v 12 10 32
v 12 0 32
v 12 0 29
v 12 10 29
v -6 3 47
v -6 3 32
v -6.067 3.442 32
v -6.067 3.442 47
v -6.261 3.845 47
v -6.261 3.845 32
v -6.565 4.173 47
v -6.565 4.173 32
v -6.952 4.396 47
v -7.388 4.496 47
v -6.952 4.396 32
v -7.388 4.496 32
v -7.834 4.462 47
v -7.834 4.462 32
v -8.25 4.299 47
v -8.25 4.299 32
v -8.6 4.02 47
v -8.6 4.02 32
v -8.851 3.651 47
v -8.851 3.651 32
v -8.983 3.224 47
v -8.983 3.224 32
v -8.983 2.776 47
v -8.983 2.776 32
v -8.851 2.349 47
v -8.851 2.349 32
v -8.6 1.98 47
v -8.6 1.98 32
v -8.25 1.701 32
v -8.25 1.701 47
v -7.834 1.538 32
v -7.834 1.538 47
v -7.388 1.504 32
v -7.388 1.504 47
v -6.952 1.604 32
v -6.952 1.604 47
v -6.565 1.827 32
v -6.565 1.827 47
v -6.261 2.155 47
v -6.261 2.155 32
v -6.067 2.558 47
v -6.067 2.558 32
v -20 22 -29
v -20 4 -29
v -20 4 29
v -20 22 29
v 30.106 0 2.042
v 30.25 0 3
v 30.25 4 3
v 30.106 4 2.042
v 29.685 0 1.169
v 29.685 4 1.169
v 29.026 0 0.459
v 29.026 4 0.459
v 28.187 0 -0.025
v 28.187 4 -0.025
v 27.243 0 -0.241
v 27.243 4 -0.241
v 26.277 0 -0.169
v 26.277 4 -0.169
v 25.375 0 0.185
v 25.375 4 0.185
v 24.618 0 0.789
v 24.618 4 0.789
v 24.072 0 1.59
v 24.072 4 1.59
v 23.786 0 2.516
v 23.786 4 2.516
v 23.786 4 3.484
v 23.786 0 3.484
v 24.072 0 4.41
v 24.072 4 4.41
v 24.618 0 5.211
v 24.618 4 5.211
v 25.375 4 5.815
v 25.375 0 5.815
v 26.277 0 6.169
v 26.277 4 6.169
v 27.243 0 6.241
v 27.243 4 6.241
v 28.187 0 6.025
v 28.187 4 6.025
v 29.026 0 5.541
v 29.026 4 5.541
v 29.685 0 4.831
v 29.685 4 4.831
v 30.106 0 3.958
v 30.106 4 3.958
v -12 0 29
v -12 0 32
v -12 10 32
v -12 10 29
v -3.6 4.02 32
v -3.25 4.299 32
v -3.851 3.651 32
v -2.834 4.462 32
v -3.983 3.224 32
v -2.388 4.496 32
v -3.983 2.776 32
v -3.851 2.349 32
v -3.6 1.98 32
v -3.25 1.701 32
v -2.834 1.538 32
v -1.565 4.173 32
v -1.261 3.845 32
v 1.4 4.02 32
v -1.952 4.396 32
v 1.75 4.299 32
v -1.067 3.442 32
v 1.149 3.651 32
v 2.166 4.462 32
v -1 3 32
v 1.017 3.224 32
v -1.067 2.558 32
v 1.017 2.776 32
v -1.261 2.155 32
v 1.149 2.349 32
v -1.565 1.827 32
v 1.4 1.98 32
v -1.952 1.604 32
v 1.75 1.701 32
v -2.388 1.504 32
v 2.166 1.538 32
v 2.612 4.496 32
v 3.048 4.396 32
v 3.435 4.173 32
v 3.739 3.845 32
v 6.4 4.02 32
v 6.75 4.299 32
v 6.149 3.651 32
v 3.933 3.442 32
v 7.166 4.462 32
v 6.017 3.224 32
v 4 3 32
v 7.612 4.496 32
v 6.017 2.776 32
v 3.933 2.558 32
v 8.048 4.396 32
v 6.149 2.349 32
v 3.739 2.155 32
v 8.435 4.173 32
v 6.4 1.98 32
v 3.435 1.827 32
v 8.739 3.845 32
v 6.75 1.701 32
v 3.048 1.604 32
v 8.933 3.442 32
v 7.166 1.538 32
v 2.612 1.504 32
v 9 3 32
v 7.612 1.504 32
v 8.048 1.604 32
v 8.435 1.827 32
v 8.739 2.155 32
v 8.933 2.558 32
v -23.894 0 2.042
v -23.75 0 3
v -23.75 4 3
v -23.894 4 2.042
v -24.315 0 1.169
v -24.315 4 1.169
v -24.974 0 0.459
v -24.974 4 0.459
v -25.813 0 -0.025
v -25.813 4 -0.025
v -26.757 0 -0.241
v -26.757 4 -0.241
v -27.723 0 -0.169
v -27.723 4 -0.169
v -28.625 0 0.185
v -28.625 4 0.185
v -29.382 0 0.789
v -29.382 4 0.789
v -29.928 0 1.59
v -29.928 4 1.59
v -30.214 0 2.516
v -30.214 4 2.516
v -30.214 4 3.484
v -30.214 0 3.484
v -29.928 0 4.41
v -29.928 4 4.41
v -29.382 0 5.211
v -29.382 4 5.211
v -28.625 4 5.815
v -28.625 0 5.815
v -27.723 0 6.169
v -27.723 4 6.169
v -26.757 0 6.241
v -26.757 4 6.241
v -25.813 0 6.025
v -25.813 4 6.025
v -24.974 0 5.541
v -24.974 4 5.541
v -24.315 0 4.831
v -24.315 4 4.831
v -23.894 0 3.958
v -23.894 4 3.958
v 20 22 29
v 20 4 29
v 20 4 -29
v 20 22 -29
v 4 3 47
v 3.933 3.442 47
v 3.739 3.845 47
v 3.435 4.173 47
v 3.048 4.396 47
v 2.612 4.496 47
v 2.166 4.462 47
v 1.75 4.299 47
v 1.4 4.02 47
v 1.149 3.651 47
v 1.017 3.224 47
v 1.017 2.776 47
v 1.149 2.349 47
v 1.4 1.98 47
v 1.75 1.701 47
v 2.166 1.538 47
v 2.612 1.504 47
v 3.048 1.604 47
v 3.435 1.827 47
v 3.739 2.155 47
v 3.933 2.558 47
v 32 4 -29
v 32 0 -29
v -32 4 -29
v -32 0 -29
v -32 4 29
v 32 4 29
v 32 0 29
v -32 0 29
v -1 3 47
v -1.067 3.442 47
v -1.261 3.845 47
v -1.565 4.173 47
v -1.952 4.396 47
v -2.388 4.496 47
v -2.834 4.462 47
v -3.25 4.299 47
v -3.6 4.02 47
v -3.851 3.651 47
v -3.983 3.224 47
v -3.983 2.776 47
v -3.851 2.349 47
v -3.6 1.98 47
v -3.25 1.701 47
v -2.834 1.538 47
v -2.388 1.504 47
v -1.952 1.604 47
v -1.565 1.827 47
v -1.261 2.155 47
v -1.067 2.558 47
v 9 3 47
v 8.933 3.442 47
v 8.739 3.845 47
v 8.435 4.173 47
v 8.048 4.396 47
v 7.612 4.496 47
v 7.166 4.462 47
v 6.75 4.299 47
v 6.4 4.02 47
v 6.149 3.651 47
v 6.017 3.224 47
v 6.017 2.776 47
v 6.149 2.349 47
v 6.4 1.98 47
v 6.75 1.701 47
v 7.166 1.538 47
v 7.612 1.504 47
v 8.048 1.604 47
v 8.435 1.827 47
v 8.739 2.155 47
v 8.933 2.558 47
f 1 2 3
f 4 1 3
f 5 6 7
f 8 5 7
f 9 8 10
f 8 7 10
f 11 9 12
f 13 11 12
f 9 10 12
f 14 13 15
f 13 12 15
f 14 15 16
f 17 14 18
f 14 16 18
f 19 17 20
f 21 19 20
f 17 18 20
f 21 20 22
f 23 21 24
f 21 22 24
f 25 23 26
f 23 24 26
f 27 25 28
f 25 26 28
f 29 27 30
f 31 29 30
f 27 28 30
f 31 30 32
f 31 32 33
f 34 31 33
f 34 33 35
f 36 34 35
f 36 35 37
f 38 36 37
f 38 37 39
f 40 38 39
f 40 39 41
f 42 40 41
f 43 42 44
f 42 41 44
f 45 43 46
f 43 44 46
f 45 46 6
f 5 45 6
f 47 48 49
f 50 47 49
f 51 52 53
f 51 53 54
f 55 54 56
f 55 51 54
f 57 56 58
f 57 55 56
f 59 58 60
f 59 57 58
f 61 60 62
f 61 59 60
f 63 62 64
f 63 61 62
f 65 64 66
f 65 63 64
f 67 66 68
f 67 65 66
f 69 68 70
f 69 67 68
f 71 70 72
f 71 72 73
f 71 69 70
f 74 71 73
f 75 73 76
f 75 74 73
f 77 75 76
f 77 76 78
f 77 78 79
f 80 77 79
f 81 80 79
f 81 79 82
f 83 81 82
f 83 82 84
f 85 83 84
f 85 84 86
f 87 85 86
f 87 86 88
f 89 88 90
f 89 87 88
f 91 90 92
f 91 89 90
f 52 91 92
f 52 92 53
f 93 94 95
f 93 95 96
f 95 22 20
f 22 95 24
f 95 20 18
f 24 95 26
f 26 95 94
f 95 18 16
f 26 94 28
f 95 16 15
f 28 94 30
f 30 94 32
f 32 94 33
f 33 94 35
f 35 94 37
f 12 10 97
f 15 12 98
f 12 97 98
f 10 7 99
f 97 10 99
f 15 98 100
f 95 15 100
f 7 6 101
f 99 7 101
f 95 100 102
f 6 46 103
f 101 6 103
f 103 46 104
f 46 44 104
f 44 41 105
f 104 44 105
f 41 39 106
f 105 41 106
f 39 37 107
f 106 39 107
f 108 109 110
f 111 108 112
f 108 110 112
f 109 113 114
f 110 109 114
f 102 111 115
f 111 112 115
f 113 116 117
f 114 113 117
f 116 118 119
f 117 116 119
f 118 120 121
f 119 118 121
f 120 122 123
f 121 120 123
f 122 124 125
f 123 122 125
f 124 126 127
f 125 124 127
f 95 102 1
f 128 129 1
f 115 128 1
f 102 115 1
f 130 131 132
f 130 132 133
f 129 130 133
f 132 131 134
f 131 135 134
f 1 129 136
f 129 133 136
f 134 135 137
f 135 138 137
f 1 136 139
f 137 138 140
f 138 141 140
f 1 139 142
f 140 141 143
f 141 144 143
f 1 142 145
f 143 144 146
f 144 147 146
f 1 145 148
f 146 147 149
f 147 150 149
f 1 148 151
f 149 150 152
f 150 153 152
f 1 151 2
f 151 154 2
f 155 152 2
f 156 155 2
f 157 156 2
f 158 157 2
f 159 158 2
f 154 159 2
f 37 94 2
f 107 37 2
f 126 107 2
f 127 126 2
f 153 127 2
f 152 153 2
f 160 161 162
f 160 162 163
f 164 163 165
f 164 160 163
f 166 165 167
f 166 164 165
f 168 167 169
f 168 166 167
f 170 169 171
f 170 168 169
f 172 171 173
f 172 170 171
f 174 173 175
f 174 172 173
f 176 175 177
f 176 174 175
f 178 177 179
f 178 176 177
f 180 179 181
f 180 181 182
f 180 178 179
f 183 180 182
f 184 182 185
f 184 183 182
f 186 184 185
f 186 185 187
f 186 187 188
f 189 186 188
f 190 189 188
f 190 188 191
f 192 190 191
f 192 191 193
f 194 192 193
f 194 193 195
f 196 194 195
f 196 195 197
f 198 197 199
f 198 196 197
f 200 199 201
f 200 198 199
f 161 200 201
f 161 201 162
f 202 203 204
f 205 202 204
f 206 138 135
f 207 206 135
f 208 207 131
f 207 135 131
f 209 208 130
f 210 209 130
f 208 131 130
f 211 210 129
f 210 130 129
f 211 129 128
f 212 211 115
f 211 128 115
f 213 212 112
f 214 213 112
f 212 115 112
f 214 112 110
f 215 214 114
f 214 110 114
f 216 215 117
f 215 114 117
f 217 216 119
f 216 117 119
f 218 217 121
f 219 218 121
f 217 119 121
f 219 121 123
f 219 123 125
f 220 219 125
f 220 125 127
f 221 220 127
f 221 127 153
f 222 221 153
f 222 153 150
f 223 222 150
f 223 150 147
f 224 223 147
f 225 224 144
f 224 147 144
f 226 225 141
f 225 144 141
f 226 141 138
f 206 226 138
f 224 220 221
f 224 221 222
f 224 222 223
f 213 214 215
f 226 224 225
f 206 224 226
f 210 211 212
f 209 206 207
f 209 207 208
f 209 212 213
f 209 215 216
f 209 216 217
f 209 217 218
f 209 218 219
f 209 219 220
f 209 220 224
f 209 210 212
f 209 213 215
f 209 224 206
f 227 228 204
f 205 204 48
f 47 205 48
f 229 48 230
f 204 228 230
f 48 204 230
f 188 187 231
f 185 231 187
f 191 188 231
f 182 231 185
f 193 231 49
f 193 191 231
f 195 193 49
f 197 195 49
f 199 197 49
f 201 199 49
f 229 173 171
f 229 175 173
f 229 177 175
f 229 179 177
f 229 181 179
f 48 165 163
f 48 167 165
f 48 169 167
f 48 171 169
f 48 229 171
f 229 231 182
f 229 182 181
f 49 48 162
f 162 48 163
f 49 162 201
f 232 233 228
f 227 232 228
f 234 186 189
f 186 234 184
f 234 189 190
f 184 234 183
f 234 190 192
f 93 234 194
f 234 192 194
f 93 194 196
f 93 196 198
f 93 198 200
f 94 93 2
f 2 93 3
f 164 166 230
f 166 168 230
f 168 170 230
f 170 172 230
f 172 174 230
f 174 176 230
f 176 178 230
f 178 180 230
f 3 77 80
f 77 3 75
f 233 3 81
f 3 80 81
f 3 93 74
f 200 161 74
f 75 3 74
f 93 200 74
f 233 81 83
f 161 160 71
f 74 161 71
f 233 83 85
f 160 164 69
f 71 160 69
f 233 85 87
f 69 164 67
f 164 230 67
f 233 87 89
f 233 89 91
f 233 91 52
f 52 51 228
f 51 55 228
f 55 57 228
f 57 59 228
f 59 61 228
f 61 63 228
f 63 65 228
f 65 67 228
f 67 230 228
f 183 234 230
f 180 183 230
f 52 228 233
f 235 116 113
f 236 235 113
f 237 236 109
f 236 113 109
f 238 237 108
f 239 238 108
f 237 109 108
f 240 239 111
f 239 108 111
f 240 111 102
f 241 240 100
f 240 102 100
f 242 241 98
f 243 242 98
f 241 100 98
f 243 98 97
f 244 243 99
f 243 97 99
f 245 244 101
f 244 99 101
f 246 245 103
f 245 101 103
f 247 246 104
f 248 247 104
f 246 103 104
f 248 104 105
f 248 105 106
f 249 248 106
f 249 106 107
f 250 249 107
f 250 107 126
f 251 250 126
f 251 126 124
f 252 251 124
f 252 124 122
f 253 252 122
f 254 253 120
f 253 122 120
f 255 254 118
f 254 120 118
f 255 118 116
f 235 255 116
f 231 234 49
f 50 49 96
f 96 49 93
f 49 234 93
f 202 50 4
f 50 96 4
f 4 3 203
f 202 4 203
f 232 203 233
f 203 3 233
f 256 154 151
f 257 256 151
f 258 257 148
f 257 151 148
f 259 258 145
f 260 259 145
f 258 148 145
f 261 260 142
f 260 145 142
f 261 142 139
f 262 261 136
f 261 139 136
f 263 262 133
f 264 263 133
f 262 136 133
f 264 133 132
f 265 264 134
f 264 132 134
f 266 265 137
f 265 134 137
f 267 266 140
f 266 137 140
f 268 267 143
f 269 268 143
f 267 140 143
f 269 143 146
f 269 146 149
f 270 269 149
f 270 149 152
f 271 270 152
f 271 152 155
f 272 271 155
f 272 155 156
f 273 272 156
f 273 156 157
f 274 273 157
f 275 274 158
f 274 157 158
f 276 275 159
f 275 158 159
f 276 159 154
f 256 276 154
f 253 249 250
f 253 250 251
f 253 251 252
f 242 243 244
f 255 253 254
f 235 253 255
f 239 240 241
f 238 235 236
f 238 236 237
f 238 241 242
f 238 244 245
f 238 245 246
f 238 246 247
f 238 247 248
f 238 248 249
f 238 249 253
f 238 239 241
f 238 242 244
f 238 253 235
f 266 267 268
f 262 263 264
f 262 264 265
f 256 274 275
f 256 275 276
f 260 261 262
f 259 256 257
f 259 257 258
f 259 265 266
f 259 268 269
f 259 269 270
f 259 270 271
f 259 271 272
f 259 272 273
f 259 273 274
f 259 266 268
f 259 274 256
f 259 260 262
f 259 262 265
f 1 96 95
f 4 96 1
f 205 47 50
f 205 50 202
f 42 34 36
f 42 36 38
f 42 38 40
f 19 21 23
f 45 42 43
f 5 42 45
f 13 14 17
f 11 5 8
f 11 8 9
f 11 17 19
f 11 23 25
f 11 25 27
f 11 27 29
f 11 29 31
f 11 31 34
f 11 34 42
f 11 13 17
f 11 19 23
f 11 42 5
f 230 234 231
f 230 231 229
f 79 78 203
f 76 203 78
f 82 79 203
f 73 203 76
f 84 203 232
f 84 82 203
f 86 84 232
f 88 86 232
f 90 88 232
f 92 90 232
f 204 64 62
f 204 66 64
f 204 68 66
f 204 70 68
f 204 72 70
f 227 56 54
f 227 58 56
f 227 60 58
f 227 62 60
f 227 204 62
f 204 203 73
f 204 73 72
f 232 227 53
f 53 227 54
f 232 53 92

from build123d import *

# Parameters (mm, degrees)
SKETCH1_W             = 12
SKETCH1_H             = 58
SKETCH1_R             = 3.25
BOSS_EXTRUDE1_DEPTH   = 4
BOSS_EXTRUDE1_2_DEPTH = 4
BOSS_EXTRUDE2_DEPTH   = 22
SKETCH1_4_W           = 24
SKETCH1_4_H           = 3
BOSS_EXTRUDE3_DEPTH   = 10
SKETCH2_R             = 1.5
BOSS_EXTRUDE4_DEPTH   = 15


with BuildPart() as part:
    # Sketch1 → Boss-Extrude1 (new body)
    with BuildSketch(Plane(origin=(0, 0, 0), x_dir=(1, 0, 0), z_dir=(0, 1, 0))):
        with Locations((-26, 0)):
            Rectangle(SKETCH1_W, SKETCH1_H)
        with Locations((-27, -3)):
            Circle(SKETCH1_R, mode=Mode.SUBTRACT)
    extrude(amount=BOSS_EXTRUDE1_DEPTH)



with BuildPart() as body_2:
    # Sketch1 → Boss-Extrude1 2 (new body)
    with BuildSketch(Plane(origin=(0, 0, 0), x_dir=(1, 0, 0), z_dir=(0, 1, 0))):
        with Locations((26, 0)):
            Rectangle(SKETCH1_W, SKETCH1_H)
        with Locations((27, -3)):
            Circle(SKETCH1_R, mode=Mode.SUBTRACT)
    extrude(amount=BOSS_EXTRUDE1_2_DEPTH)


with BuildPart() as part_1:
    add(part.part)

    add(body_2.part)  # Boss-Extrude2 merges body 2
    # Sketch1<3> → Boss-Extrude2 (add)
    with BuildSketch(Plane(origin=(0, 0, 0), x_dir=(1, 0, 0), z_dir=(0, 1, 0))):
        Polygon((20, 29), (-20, 29), (-20, -29), (-12, -29), (12, -29), (20, -29), align=None)
    extrude(amount=BOSS_EXTRUDE2_DEPTH)

    # Sketch1<4> → Boss-Extrude3 (add)
    with BuildSketch(Plane(origin=(0, 0, 0), x_dir=(1, 0, 0), z_dir=(0, 1, 0))):
        with Locations((0, -30.5)):
            Rectangle(SKETCH1_4_W, SKETCH1_4_H)
    extrude(amount=BOSS_EXTRUDE3_DEPTH)

    # Sketch2 → Boss-Extrude4 (add)
    with BuildSketch(Plane.XY.offset(32)):
        with Locations((-7.5, 3)):
            Circle(SKETCH2_R)
        with Locations((-2.5, 3)):
            Circle(SKETCH2_R)
        with Locations((2.5, 3)):
            Circle(SKETCH2_R)
        with Locations((7.5, 3)):
            Circle(SKETCH2_R)
    extrude(amount=BOSS_EXTRUDE4_DEPTH)


solid = part_1.part
